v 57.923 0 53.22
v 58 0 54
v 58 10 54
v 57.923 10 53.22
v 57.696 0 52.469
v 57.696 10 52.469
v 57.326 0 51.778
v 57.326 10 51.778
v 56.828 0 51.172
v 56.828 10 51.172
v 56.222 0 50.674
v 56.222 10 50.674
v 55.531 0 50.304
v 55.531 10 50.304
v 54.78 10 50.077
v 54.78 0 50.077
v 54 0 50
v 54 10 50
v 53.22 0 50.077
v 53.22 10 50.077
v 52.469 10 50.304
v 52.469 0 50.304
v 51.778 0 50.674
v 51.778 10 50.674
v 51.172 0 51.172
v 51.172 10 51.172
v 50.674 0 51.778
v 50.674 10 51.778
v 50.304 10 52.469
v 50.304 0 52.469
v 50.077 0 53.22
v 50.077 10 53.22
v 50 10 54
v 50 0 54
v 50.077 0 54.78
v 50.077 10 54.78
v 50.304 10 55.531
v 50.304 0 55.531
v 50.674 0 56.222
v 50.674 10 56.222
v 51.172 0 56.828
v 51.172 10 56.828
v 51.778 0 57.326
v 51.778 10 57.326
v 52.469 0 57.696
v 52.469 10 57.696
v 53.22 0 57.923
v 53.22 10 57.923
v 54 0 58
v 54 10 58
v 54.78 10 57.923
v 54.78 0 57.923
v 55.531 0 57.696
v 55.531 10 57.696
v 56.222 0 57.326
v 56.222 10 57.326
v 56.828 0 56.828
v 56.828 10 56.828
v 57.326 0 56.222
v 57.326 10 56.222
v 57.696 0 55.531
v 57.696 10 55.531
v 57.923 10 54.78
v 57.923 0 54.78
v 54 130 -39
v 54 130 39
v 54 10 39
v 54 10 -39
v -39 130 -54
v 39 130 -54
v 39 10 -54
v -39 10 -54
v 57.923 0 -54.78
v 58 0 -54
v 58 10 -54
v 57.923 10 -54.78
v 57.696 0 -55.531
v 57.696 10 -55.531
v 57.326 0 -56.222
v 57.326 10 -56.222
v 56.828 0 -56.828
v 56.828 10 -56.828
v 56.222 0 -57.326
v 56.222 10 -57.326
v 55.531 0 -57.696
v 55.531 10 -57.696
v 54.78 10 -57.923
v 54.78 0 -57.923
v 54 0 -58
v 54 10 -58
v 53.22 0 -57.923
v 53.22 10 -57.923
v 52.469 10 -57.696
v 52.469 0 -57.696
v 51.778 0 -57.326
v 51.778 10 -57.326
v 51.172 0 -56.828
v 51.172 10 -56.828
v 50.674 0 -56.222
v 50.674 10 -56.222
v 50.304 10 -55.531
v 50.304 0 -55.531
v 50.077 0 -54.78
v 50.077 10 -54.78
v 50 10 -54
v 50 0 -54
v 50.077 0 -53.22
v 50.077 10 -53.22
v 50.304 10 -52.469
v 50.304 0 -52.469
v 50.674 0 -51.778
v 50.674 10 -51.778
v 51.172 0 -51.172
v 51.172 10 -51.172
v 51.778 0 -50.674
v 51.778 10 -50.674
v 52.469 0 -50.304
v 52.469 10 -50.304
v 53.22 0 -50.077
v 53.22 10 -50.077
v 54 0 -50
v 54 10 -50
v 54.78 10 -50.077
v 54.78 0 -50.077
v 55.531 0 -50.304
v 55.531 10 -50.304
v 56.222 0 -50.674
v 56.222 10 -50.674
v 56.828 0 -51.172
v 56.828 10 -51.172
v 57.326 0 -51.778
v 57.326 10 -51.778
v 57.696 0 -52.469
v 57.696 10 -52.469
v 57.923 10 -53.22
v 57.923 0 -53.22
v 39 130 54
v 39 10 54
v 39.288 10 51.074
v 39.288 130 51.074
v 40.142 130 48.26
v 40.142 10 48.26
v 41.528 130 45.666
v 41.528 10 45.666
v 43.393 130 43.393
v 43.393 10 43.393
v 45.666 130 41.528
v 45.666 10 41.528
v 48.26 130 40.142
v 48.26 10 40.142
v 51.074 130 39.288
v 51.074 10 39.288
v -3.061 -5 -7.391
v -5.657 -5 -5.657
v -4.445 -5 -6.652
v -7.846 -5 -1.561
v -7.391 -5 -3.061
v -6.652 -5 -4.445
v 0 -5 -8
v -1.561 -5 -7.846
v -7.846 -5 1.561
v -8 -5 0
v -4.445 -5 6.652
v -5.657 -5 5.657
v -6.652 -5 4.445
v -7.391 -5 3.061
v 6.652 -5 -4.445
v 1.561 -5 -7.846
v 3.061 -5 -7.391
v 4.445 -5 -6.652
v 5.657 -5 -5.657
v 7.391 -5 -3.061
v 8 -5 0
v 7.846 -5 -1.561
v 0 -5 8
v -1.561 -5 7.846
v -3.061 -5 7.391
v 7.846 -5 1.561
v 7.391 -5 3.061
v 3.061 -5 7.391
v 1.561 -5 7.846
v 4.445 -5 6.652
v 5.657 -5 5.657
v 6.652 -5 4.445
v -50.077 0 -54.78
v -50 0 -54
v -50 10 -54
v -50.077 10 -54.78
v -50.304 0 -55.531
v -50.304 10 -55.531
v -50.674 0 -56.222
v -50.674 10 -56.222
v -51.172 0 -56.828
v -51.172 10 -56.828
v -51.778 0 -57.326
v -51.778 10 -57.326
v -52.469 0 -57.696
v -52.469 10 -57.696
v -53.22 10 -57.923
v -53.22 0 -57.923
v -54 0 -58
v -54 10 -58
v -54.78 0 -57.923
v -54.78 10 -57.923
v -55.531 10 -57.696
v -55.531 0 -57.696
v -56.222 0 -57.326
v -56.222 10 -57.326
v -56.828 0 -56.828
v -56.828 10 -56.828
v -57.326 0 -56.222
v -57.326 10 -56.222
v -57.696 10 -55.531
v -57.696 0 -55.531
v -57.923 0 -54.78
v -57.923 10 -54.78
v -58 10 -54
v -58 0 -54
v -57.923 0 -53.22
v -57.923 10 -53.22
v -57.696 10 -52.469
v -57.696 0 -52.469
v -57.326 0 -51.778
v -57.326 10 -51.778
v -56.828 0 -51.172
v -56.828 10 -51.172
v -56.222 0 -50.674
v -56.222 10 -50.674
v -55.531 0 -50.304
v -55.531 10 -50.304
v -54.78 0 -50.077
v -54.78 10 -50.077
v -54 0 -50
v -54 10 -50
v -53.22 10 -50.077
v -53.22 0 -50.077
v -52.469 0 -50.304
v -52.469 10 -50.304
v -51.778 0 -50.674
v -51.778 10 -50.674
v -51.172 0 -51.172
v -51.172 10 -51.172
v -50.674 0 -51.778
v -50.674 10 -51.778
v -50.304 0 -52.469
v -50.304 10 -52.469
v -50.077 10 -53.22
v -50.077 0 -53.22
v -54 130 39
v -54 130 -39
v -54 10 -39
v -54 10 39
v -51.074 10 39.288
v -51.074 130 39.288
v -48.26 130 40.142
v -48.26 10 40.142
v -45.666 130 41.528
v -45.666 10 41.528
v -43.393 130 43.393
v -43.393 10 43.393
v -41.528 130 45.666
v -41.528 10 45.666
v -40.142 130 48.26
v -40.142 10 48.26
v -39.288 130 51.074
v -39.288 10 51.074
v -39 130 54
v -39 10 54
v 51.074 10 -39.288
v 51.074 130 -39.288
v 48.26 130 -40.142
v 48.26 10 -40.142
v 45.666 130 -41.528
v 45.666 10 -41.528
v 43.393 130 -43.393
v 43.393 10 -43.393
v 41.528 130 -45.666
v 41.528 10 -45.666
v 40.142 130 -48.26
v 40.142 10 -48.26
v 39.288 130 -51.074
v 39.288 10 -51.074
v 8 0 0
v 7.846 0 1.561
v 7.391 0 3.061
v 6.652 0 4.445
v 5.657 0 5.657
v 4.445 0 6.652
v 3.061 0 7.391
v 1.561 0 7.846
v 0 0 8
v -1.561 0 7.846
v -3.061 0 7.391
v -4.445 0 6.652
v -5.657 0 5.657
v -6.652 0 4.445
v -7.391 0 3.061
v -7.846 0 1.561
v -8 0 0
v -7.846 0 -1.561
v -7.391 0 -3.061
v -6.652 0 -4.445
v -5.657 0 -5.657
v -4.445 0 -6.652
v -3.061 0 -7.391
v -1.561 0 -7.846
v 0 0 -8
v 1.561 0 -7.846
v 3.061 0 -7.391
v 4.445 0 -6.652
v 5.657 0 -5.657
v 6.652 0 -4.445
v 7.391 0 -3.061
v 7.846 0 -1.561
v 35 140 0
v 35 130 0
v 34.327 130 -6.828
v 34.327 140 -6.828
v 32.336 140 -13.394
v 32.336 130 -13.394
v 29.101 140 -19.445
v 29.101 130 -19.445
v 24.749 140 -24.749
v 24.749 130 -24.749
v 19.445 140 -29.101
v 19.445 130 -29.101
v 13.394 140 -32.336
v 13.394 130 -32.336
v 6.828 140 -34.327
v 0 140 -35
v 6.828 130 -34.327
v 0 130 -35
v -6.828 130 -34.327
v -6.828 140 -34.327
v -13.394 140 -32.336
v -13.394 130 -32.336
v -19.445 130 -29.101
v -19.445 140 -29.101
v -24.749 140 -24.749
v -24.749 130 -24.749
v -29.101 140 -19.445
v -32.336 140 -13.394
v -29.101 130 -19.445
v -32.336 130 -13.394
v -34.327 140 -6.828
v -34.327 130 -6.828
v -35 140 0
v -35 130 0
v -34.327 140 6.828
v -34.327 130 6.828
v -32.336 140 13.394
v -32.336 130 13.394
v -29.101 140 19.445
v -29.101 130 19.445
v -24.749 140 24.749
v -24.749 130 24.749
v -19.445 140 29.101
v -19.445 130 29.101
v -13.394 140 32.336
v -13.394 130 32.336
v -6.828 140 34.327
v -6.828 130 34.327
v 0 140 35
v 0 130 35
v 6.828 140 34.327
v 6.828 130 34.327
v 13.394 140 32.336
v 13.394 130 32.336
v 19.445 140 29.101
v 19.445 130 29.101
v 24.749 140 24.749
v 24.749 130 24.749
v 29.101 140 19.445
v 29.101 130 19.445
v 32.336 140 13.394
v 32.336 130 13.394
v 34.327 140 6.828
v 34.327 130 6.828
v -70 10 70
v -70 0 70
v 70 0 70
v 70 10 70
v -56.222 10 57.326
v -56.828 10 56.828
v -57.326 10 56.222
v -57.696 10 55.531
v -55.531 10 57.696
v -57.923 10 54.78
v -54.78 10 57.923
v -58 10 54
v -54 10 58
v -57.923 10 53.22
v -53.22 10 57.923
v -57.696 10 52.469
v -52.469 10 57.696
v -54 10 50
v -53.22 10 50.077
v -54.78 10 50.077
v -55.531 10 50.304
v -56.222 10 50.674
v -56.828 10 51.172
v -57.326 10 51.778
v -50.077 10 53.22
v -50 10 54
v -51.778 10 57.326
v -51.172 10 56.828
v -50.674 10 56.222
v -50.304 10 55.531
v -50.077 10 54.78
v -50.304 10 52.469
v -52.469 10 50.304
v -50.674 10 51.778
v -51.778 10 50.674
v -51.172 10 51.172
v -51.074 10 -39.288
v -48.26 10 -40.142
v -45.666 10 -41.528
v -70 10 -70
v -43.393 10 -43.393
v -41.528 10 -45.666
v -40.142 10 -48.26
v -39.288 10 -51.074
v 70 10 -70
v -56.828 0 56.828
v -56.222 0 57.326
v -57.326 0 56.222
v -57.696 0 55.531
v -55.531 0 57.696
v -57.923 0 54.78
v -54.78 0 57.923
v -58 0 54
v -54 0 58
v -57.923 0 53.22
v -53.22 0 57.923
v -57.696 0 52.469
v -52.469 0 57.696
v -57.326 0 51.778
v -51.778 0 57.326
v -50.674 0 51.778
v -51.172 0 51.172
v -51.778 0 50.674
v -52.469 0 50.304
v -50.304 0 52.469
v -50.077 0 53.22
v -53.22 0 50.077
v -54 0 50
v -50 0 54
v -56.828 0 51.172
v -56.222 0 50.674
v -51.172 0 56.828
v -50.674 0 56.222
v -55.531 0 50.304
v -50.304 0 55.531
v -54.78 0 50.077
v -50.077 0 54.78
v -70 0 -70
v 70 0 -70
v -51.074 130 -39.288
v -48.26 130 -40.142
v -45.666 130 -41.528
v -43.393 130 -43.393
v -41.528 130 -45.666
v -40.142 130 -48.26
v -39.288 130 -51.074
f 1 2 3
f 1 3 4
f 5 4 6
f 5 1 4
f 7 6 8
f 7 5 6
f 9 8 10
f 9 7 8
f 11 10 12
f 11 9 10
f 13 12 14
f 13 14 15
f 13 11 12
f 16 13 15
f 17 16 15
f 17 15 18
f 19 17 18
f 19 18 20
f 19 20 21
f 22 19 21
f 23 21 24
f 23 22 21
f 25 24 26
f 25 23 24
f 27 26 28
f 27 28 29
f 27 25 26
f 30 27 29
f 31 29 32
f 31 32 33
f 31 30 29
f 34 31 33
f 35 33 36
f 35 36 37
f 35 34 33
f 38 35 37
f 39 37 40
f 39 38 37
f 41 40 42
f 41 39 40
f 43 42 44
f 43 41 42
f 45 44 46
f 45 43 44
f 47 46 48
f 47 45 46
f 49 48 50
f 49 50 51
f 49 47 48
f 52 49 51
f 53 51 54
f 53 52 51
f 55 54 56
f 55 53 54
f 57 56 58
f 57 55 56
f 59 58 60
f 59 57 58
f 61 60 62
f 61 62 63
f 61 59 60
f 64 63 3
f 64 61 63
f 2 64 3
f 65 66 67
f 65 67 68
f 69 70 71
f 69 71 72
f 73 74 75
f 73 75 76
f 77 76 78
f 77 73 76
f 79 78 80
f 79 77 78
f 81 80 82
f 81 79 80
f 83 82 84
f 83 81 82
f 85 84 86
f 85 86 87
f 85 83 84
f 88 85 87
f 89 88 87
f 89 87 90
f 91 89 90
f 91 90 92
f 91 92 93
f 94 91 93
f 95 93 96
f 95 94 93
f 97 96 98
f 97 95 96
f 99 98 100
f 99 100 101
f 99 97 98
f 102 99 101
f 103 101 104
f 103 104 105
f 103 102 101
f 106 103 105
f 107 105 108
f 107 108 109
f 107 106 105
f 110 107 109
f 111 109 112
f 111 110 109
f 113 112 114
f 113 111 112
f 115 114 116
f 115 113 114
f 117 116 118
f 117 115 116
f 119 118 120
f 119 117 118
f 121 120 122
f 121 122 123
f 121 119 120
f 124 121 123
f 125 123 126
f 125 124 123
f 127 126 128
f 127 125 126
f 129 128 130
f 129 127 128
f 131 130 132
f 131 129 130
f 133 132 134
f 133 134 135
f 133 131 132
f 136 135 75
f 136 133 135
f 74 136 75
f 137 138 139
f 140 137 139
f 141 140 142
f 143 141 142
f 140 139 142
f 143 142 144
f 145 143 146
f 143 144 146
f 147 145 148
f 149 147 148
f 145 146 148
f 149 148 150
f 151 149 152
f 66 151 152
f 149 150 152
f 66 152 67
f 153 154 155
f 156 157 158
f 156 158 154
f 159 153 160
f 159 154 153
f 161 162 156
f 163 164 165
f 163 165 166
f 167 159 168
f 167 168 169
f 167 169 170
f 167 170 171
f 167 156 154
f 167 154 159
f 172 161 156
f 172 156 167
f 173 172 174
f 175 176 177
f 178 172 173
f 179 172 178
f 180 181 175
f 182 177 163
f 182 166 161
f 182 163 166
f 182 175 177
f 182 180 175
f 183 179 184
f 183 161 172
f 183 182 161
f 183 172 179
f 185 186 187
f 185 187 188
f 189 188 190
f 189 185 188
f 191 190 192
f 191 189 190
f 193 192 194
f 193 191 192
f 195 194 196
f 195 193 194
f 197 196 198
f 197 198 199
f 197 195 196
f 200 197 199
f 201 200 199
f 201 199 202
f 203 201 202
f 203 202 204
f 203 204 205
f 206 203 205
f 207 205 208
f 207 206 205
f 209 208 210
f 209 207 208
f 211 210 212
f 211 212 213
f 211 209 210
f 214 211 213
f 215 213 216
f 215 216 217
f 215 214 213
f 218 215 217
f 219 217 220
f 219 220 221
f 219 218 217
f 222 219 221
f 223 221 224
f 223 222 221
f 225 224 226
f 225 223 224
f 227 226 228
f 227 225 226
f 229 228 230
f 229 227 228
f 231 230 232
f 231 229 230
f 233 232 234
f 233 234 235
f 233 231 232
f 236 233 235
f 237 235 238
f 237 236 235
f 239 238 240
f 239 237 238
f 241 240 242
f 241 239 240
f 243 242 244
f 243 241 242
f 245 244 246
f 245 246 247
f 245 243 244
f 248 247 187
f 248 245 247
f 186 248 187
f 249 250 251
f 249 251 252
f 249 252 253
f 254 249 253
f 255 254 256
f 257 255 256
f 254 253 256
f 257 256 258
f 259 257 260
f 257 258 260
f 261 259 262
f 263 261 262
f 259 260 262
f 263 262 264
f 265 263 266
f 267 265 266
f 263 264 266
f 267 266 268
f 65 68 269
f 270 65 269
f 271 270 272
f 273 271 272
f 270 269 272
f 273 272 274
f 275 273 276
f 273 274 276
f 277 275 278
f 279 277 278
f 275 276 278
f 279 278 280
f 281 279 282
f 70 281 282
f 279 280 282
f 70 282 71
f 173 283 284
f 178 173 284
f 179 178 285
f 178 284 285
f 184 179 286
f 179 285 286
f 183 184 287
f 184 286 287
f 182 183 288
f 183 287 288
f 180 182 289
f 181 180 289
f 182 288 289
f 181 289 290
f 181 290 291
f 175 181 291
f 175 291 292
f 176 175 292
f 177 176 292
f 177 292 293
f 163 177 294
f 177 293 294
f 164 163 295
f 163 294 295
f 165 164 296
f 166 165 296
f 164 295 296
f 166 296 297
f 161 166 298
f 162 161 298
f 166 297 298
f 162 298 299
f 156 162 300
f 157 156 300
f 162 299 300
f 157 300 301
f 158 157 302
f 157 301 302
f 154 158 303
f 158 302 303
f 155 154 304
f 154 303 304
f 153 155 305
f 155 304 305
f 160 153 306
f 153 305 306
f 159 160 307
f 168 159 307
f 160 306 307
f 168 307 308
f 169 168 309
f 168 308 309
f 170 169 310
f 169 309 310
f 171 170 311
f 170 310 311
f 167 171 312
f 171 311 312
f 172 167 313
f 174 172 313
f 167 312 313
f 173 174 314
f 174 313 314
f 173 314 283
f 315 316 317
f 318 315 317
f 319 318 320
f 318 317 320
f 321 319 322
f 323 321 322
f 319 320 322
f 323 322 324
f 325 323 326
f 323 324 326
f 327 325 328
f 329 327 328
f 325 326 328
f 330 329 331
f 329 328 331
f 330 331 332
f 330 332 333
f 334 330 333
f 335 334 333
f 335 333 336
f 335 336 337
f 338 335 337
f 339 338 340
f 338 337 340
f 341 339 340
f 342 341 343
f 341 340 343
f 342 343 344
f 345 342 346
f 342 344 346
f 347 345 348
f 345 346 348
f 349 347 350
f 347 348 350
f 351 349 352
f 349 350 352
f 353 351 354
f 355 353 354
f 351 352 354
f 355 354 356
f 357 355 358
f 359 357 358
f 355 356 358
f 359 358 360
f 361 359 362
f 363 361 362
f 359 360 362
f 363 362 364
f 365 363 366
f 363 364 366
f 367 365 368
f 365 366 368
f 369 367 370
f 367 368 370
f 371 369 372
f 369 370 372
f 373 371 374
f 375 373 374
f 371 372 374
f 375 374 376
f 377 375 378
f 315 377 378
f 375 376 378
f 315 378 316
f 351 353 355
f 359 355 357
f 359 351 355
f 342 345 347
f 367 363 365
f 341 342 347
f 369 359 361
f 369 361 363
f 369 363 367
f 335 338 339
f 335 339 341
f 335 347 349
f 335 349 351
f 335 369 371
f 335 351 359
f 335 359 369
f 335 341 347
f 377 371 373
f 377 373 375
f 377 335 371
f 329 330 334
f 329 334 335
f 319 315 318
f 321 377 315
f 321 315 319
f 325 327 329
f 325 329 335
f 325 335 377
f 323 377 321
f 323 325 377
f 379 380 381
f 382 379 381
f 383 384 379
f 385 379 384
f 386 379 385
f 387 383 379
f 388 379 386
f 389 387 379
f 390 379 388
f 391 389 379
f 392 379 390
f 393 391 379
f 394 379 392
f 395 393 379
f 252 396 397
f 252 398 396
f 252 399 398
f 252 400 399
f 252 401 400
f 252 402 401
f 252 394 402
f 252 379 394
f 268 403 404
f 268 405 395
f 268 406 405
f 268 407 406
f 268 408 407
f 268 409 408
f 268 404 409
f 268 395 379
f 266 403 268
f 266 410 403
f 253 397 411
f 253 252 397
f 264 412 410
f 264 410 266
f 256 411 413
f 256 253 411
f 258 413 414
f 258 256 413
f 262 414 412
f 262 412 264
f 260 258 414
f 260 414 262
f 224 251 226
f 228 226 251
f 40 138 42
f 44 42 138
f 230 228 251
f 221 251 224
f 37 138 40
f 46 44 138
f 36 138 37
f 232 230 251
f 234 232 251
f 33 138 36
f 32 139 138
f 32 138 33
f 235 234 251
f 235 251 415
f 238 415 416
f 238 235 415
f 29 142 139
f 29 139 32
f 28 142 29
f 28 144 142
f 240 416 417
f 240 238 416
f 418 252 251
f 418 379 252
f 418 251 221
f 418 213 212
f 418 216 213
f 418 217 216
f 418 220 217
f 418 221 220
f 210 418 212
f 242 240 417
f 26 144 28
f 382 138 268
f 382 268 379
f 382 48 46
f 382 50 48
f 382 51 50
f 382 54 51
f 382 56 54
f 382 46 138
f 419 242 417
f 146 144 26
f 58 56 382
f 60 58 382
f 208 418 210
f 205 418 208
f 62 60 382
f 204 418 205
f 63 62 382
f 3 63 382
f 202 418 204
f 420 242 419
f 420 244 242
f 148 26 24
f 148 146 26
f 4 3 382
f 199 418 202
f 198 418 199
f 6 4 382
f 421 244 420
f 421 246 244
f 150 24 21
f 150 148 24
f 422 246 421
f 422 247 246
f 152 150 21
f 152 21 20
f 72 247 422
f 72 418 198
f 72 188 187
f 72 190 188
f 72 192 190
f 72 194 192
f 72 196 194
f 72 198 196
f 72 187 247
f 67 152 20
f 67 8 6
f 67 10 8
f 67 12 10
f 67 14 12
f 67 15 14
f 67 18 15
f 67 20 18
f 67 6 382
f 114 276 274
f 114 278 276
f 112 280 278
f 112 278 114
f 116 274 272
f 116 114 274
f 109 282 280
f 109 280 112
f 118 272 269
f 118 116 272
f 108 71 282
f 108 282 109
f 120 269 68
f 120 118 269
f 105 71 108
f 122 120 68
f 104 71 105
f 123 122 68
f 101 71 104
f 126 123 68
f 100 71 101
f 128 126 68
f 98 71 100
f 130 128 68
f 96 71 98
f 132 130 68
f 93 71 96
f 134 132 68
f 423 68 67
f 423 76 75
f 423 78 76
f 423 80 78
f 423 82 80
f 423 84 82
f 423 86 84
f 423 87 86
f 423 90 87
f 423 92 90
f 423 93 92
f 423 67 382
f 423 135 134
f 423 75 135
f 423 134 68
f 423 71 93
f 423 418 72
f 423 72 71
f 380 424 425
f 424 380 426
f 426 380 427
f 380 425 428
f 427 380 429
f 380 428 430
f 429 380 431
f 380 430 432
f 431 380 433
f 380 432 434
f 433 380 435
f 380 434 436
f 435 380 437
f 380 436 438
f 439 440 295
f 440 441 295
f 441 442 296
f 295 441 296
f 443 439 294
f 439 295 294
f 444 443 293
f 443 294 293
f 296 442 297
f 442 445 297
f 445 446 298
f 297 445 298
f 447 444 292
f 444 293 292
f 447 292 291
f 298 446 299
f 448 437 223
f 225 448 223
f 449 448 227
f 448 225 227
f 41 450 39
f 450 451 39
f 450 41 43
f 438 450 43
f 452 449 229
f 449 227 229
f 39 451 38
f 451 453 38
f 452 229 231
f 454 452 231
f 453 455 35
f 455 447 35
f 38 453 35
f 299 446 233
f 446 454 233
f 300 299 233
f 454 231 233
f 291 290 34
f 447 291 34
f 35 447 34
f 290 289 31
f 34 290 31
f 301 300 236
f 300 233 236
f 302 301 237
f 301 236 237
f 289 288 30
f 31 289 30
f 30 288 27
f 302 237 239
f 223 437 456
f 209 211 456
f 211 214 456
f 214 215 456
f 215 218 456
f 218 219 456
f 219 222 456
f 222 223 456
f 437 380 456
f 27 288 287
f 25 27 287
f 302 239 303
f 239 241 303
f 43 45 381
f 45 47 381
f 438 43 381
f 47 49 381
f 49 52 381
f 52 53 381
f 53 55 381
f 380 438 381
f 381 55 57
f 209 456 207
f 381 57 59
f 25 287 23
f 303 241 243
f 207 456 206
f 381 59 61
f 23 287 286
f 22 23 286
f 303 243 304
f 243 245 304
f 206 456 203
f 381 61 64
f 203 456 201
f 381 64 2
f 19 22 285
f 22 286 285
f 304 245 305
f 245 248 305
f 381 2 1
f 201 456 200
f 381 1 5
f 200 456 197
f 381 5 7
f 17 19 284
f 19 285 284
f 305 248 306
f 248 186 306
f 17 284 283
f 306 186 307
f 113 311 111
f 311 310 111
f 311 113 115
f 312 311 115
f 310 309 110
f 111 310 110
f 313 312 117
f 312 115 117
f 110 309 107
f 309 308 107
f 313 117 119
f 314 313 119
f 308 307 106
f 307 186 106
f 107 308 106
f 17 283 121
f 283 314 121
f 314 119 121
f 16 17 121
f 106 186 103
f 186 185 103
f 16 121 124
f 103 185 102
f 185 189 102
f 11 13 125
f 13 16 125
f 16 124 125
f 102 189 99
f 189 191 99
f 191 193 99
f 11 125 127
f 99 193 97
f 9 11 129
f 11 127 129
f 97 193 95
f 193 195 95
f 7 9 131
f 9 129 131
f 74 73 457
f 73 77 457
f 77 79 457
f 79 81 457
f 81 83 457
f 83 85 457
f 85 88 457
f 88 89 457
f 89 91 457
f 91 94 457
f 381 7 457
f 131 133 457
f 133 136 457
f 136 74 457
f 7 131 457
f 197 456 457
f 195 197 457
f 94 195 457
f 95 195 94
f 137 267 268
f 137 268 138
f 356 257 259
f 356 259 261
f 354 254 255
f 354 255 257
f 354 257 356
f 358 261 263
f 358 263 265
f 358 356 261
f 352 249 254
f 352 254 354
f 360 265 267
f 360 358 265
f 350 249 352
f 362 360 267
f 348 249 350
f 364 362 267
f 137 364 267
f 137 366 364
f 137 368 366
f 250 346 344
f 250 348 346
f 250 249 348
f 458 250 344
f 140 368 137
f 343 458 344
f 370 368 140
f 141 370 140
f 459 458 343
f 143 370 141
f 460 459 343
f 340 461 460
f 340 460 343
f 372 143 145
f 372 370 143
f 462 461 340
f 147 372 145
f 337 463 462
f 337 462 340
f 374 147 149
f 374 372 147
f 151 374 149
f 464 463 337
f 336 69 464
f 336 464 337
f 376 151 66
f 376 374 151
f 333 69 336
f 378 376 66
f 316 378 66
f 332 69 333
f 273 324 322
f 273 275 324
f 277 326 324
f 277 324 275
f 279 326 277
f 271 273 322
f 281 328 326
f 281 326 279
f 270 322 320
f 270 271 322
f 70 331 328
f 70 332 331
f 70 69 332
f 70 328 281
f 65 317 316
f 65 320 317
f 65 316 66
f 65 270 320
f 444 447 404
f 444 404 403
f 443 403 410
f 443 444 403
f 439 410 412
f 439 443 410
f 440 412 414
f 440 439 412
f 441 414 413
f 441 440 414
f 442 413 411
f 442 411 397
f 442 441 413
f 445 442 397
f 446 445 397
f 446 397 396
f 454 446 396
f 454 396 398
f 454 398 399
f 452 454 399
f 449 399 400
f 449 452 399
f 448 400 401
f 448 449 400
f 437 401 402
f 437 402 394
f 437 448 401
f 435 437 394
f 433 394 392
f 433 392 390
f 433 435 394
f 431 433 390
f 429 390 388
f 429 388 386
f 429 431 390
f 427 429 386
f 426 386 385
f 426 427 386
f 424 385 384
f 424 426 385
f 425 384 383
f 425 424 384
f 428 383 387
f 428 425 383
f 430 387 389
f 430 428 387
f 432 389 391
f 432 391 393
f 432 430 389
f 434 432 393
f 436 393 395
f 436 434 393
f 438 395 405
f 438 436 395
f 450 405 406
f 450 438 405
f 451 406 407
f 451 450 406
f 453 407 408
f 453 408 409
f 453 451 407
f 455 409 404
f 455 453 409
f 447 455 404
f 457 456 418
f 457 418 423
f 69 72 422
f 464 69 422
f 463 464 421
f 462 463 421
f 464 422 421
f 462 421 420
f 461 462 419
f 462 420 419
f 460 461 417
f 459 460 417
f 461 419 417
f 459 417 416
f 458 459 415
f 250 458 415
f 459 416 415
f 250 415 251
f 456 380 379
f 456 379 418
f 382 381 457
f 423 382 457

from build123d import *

# Parameters (mm, degrees)
SKETCH_1_W      = 140
SKETCH_1_H      = 140
SKETCH_1_R      = 4
EXTRUDE_1_DEPTH = 10
EXTRUDE_2_DEPTH = 120
SKETCH_3_R      = 35
EXTRUDE_3_DEPTH = 10
SKETCH_4_R      = 8
EXTRUDE_4_DEPTH = 5


with BuildPart() as part:
    # 草图1 → 凸台-拉伸1 (new body)
    with BuildSketch(Plane(origin=(0, 0, 0), x_dir=(1, 0, 0), z_dir=(0, 1, 0))):
        Rectangle(SKETCH_1_W, SKETCH_1_H)
        with Locations((54, 54)):
            Circle(SKETCH_1_R, mode=Mode.SUBTRACT)
        with Locations((54, -54)):
            Circle(SKETCH_1_R, mode=Mode.SUBTRACT)
        with Locations((-54, -54)):
            Circle(SKETCH_1_R, mode=Mode.SUBTRACT)
        with Locations((-54, 54)):
            Circle(SKETCH_1_R, mode=Mode.SUBTRACT)
    extrude(amount=EXTRUDE_1_DEPTH)

    # 草图2 → 凸台-拉伸2 (add)
    with BuildSketch(Plane(origin=(0, 10, 0), x_dir=(1, 0, 0), z_dir=(0, 1, 0))):
        with BuildLine():
            Line((39, 54), (-39, 54))
            ThreePointArc((-39, 54), (-43.393398282, 43.393398282), (-54, 39))
            Line((-54, 39), (-54, -39))
            ThreePointArc((-54, -39), (-43.393398282, -43.393398282), (-39, -54))
            Line((-39, -54), (39, -54))
            ThreePointArc((39, -54), (43.393398282, -43.393398282), (54, -39))
            Line((54, -39), (54, 39))
            ThreePointArc((54, 39), (43.393398282, 43.393398282), (39, 54))
        make_face()
    extrude(amount=EXTRUDE_2_DEPTH)

    # 草图3 → 凸台-拉伸3 (add)
    with BuildSketch(Plane(origin=(0, 130, 0), x_dir=(1, 0, 0), z_dir=(0, 1, 0))):
        Circle(SKETCH_3_R)
    extrude(amount=EXTRUDE_3_DEPTH)

    # 草图4 → 凸台-拉伸4 (add)
    with BuildSketch(Plane.XZ):
        Circle(SKETCH_4_R)
    extrude(amount=EXTRUDE_4_DEPTH)


solid = part.part
